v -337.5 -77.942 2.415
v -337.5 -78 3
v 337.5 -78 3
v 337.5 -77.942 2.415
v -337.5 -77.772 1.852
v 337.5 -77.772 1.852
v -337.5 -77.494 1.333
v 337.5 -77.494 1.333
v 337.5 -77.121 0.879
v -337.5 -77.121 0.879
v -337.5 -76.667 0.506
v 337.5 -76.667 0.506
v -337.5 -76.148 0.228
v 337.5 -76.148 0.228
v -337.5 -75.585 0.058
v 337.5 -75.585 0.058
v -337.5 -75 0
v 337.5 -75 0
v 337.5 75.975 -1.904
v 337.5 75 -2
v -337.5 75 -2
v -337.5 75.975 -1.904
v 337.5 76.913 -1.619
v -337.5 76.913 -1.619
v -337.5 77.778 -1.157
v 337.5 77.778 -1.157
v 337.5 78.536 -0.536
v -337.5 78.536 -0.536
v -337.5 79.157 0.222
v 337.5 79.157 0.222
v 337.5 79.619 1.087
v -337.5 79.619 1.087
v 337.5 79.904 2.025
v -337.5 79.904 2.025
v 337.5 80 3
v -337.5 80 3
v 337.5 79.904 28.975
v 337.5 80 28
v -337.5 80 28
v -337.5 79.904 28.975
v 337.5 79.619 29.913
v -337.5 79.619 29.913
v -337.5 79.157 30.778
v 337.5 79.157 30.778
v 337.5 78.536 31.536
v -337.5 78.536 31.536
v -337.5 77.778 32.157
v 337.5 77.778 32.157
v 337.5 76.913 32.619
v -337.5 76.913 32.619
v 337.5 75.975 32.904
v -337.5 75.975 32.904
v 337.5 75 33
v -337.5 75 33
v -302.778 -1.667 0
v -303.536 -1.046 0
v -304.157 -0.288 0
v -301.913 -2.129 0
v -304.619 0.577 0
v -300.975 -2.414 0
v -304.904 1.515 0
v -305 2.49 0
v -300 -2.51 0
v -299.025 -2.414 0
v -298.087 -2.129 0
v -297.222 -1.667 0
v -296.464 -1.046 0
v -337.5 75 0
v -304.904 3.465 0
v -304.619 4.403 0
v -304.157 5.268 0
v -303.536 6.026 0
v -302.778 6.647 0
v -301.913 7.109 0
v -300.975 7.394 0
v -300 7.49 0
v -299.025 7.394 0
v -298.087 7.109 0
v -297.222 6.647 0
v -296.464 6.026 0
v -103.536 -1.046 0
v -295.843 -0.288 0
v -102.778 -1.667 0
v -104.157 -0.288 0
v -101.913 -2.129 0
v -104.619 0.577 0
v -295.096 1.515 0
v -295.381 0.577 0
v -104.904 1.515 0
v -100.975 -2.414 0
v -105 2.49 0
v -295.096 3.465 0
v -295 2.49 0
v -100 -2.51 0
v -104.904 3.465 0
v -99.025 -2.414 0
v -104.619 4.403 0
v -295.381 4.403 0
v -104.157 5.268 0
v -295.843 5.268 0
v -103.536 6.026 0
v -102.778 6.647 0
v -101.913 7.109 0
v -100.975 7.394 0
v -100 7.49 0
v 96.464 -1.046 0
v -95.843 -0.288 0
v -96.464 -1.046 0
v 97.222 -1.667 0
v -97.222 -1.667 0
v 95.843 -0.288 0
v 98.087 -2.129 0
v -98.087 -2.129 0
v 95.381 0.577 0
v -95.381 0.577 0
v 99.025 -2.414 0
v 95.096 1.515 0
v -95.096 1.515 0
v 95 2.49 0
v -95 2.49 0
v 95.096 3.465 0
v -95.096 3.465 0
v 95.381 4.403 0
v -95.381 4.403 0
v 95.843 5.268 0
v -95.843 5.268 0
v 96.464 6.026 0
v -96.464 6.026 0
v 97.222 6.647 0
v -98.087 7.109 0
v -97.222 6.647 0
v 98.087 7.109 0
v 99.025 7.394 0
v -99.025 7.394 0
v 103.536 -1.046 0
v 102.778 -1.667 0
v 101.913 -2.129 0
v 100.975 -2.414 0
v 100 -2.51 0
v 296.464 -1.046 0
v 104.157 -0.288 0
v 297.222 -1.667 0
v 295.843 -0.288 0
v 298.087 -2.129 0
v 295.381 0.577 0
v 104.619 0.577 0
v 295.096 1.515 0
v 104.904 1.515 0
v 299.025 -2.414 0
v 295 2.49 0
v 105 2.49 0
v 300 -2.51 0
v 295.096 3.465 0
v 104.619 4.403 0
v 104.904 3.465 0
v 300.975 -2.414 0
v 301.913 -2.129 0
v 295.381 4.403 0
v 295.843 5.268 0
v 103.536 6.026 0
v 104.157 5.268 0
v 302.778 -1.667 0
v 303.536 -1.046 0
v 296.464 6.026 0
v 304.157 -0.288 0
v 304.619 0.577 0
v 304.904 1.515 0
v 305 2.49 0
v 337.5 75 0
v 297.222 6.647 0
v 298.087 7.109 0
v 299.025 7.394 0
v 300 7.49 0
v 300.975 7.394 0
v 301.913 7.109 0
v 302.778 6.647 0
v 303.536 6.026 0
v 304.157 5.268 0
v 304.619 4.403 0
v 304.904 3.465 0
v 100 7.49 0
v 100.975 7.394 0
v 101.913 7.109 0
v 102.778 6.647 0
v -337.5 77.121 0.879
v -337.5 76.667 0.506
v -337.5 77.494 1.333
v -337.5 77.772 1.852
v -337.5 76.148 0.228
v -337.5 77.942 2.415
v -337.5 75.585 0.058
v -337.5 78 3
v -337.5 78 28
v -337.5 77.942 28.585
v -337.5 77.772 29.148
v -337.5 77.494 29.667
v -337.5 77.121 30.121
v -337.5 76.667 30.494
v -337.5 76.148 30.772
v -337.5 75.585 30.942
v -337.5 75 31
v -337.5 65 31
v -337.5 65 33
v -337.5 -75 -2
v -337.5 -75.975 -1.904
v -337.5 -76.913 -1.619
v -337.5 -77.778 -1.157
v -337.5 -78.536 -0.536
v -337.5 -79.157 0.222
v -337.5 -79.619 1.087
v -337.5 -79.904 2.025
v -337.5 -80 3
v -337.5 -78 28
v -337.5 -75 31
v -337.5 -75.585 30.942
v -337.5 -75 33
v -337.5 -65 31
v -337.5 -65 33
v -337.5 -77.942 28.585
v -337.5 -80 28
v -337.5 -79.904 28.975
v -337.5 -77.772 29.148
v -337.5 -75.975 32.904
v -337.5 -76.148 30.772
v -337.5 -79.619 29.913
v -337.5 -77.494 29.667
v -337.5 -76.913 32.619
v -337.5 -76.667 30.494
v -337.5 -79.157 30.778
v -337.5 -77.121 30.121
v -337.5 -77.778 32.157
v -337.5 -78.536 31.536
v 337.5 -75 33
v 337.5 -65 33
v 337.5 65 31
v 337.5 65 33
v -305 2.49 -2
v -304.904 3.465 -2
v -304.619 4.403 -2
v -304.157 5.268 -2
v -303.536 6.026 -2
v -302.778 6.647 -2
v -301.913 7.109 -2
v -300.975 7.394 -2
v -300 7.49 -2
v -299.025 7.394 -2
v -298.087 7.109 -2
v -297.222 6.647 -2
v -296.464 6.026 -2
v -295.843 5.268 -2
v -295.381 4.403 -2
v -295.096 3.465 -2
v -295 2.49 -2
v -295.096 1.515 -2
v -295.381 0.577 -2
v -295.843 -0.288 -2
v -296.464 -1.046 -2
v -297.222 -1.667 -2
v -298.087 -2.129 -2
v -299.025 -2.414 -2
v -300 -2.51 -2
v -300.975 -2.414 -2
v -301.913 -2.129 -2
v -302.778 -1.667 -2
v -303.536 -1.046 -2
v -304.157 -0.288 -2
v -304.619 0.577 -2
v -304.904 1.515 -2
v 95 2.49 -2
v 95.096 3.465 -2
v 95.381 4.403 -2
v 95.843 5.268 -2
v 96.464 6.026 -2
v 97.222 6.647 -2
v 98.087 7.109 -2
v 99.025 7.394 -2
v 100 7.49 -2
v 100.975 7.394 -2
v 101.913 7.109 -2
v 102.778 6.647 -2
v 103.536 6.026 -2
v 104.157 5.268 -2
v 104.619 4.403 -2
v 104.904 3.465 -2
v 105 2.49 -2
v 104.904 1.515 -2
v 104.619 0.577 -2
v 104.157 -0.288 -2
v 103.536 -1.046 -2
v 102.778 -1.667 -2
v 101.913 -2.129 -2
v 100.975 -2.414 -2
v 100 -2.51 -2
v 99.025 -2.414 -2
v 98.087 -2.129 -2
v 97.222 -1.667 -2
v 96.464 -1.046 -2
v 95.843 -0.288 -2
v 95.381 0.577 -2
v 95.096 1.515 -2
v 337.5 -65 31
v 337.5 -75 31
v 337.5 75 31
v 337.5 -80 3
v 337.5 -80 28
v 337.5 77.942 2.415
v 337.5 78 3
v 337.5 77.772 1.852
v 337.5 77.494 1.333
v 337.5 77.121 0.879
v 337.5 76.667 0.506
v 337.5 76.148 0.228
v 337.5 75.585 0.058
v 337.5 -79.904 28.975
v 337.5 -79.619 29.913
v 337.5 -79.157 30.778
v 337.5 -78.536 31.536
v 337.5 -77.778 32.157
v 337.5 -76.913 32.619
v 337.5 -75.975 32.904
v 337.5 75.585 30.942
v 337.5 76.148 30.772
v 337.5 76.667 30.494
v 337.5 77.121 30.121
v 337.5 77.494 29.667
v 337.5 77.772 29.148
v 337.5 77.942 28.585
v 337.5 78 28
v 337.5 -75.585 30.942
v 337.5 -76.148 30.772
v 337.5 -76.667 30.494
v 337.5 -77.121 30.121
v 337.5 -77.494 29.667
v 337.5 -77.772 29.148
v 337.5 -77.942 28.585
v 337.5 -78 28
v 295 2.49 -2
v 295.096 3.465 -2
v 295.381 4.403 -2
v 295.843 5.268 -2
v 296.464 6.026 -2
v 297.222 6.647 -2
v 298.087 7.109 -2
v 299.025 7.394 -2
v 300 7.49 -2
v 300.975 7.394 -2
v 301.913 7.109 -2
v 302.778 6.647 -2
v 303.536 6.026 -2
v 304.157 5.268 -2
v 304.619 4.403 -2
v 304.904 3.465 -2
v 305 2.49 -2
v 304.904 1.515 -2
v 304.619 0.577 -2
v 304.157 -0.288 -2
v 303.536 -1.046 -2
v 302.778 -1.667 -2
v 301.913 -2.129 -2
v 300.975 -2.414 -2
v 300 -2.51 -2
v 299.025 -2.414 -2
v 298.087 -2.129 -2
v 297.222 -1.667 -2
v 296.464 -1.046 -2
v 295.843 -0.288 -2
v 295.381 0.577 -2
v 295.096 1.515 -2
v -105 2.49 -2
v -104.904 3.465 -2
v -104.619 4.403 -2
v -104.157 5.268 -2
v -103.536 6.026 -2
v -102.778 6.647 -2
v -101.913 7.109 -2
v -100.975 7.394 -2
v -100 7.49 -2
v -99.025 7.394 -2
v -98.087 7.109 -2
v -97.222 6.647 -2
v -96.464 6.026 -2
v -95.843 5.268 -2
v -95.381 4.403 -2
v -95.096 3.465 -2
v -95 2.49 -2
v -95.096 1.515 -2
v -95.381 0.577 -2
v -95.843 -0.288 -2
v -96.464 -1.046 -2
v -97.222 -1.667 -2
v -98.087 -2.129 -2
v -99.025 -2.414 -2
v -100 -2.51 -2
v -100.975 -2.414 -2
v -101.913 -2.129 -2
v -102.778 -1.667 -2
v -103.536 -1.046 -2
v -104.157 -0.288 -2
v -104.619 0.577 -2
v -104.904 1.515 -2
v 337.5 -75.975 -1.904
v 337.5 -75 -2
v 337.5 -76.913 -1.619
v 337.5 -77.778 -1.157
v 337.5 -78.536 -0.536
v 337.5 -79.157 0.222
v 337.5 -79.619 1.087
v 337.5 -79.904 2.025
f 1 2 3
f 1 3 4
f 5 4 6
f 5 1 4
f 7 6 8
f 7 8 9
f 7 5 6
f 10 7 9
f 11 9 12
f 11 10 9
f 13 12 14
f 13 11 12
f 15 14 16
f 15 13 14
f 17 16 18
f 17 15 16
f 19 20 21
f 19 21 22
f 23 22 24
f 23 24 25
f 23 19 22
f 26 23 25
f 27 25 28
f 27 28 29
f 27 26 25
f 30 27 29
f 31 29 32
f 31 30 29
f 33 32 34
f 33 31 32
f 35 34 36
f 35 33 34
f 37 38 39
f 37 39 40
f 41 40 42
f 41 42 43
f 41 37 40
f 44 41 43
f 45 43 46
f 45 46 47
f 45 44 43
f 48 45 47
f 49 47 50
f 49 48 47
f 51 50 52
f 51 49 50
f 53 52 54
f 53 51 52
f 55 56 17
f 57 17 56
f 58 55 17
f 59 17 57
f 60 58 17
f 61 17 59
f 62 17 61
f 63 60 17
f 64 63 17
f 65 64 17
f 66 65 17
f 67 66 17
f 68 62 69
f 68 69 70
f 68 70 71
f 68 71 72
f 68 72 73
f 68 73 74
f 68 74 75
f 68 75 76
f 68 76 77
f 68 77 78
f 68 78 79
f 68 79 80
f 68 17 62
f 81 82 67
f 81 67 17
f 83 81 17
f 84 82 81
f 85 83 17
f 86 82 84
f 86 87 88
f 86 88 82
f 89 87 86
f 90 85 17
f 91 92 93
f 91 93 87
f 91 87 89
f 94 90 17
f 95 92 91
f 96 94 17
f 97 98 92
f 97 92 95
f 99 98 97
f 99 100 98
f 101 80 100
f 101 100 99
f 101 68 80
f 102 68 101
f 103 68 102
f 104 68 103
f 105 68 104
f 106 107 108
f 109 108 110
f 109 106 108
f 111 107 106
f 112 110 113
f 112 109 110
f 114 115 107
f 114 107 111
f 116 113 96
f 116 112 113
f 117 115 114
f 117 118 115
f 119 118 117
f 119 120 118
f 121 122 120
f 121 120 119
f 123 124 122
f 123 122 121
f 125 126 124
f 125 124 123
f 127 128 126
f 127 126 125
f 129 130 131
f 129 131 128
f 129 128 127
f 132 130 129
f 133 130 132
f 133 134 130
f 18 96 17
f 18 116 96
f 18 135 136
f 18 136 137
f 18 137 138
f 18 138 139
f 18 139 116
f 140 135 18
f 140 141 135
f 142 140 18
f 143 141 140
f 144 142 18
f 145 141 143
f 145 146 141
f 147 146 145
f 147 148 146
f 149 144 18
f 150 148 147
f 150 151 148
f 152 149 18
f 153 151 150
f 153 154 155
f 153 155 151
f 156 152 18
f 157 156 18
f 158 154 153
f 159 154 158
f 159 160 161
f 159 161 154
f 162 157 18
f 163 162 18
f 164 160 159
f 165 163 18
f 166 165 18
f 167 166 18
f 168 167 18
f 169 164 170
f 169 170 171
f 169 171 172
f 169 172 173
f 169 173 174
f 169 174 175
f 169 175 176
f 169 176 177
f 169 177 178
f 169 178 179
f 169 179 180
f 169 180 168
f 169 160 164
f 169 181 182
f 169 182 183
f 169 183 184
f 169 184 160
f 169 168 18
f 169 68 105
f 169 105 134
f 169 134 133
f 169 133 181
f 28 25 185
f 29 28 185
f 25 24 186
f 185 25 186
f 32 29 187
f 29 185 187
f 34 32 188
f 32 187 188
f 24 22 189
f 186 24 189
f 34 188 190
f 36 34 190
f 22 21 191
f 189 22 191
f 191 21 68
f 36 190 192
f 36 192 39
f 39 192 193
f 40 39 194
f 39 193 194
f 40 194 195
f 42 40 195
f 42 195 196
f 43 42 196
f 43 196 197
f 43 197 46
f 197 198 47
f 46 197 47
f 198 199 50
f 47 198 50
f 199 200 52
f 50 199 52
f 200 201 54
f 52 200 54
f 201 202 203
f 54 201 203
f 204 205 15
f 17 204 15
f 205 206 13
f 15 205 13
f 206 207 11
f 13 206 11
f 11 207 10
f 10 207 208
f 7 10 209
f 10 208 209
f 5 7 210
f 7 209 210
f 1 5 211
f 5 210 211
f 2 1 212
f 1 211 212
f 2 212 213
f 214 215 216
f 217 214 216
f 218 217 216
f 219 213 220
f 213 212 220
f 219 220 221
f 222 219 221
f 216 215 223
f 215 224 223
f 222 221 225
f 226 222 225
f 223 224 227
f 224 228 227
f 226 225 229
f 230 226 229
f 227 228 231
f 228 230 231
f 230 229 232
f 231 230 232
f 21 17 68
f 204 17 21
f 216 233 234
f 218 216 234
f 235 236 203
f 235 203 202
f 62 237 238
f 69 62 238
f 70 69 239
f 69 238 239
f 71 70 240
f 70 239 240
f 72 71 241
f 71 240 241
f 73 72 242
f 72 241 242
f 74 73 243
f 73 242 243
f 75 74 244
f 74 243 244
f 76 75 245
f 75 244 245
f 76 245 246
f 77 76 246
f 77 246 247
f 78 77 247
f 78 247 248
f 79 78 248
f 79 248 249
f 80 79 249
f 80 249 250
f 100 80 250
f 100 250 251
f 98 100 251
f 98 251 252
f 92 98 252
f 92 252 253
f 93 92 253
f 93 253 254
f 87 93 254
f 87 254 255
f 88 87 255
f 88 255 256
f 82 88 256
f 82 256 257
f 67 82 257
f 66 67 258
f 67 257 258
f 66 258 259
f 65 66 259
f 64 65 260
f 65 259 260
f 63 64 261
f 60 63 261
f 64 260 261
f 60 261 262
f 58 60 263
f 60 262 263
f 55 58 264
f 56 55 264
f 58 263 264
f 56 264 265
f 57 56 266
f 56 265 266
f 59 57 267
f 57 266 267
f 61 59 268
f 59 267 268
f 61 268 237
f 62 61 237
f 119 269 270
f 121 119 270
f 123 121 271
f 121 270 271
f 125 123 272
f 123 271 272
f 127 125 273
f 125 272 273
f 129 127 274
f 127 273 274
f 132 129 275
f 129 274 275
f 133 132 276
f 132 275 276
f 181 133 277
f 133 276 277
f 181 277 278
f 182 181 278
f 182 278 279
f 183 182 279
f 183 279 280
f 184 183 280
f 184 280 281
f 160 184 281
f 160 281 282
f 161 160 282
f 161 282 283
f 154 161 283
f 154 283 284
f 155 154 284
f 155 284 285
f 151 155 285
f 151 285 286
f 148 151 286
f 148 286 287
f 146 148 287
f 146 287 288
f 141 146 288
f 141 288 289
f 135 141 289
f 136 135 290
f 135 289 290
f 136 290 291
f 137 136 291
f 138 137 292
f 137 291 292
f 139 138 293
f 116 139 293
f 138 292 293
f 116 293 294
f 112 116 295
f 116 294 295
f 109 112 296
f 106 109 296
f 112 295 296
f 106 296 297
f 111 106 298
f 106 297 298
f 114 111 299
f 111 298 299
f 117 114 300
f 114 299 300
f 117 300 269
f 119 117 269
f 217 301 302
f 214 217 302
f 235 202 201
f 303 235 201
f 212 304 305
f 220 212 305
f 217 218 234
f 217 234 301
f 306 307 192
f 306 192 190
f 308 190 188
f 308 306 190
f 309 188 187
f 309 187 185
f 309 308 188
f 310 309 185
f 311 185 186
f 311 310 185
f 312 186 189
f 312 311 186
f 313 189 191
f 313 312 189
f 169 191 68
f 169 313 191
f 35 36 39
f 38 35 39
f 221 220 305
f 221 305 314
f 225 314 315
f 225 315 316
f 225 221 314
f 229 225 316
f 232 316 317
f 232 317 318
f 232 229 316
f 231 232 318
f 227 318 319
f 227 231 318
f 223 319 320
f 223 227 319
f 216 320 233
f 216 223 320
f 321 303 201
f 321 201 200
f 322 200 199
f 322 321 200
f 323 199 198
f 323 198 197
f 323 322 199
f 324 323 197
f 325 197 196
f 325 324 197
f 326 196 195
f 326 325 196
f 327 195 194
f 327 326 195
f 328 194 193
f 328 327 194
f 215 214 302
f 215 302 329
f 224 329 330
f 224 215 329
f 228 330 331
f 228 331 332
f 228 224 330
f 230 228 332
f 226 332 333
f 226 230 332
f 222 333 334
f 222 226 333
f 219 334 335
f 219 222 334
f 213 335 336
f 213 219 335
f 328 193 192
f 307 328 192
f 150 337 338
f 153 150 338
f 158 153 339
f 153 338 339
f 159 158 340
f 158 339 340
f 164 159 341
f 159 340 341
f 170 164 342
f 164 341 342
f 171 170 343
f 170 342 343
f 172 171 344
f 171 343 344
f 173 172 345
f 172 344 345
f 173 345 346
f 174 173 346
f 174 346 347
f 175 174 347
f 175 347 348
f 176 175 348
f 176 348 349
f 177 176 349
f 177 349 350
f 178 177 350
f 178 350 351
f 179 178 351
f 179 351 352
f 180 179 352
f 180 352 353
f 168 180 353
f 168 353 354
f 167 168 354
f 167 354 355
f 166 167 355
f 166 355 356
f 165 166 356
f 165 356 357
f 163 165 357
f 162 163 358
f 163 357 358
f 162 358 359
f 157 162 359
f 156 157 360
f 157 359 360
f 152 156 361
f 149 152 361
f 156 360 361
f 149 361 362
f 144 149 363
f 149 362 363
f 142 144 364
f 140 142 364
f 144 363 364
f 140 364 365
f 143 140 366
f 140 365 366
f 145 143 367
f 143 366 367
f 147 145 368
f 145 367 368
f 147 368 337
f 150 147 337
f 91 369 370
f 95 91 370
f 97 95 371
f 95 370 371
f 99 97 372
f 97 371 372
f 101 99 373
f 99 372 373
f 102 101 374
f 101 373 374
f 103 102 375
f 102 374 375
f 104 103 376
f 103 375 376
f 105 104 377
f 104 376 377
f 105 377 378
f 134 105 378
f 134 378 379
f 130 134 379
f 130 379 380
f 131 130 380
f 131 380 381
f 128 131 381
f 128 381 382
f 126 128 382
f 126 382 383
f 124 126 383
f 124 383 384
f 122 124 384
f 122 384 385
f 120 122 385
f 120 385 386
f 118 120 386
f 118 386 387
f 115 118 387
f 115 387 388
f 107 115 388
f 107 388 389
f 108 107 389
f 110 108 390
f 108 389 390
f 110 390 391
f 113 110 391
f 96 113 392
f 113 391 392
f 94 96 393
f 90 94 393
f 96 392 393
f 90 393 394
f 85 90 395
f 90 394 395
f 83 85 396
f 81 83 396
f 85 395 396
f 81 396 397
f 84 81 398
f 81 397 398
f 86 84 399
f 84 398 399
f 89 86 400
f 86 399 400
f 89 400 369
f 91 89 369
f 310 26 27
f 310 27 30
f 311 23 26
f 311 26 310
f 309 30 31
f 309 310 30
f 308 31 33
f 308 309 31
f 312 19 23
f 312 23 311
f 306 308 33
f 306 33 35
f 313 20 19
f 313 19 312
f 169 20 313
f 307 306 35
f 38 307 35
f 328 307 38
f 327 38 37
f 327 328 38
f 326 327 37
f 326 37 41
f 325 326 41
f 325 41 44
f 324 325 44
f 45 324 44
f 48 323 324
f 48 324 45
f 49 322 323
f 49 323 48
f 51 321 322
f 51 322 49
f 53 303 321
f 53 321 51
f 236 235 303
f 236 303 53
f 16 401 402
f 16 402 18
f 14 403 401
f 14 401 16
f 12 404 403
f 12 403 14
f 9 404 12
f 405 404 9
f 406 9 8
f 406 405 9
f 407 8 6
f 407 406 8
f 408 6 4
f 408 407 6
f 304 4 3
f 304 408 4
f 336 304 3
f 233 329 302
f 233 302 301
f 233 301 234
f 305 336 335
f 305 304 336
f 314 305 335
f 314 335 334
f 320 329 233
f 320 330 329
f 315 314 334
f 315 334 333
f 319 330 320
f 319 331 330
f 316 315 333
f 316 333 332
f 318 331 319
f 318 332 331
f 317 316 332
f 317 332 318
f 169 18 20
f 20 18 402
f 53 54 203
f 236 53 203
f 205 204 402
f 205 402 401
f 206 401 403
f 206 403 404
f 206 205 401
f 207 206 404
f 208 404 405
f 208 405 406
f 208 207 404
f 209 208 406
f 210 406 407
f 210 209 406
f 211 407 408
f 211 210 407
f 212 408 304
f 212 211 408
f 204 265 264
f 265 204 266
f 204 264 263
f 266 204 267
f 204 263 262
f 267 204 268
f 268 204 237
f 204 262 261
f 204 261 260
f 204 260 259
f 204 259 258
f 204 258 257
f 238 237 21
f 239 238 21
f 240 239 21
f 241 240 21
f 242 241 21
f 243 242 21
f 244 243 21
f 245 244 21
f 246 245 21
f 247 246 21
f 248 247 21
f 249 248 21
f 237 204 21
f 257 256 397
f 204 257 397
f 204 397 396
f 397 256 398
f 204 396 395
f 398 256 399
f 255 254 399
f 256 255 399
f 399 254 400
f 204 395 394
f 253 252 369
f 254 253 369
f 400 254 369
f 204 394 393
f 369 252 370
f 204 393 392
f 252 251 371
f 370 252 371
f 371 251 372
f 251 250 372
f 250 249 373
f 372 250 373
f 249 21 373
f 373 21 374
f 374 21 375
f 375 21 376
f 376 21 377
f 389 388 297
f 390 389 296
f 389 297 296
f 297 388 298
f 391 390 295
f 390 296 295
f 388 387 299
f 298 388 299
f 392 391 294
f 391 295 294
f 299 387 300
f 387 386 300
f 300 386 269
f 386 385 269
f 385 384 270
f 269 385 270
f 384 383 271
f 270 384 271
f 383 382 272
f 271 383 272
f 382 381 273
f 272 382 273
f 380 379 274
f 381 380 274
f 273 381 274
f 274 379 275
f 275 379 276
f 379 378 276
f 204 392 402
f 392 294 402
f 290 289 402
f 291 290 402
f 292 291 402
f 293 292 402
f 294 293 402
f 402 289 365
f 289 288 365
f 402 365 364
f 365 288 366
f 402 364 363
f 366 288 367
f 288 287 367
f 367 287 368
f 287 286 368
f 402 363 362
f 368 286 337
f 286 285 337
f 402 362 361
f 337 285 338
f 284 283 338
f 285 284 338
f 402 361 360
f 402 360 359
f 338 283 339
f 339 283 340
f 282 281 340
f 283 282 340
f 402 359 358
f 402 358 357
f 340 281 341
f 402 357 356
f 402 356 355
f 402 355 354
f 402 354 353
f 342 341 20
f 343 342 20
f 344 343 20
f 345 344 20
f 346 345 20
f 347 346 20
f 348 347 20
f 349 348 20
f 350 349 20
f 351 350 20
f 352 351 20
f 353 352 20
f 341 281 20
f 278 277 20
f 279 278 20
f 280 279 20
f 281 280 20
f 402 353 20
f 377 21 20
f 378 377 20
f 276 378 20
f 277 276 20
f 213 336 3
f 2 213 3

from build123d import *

# Parameters (mm, degrees)
SKETCH1_W                      = 675
SKETCH1_H                      = 160
BASE_FLANGE1_DEPTH             = 2
EDGE_FLANGE1_STRIP_W           = 14
EDGE_FLANGE1_STRIP_H           = 2
EDGE_FLANGE1_STRIP_CUT_DEPTH   = 675
EDGE_FLANGE1_STRIP_2_W         = 14
EDGE_FLANGE1_STRIP_2_H         = 2
EDGE_FLANGE1_STRIP_CUT_2_DEPTH = 675
EDGE_FLANGE1_DEPTH             = 675
EDGE_FLANGE1_BEND_DEPTH        = 675
EDGE_FLANGE2_STRIP_W           = 14
EDGE_FLANGE2_STRIP_H           = 2
EDGE_FLANGE2_STRIP_CUT_DEPTH   = 675
EDGE_FLANGE2_STRIP_2_W         = 14
EDGE_FLANGE2_STRIP_2_H         = 2
EDGE_FLANGE2_STRIP_CUT_2_DEPTH = 675
EDGE_FLANGE2_DEPTH             = 675
EDGE_FLANGE2_BEND_DEPTH        = 675
SKETCH18_R                     = 5
CUT_EXTRUDE1_DEPTH             = 10
LPATTERN1_COUNT                = 4
LPATTERN1_PITCH                = 200


# Sheet-metal steps are written as plain solids
with BuildPart() as part:
    # Sketch1 → Base-Flange1 (new body)
    with BuildSketch(Plane.XY):
        Rectangle(SKETCH1_W, SKETCH1_H)
    extrude(amount=-BASE_FLANGE1_DEPTH)

    # Edge-Flange1 strip (across the edge) → Edge-Flange1 strip cut (cut)
    with BuildSketch(Plane(origin=(337.5, 80, 0), x_dir=(0, -1, 0), z_dir=(-1, 0, 0))):
        with Locations((-2, -1)):
            Rectangle(EDGE_FLANGE1_STRIP_W, EDGE_FLANGE1_STRIP_H)
    extrude(amount=EDGE_FLANGE1_STRIP_CUT_DEPTH, mode=Mode.SUBTRACT)

    # Edge-Flange1 strip 2 (across the edge) → Edge-Flange1 strip cut 2 (cut)
    with BuildSketch(Plane(origin=(-337.5, -80, 0), x_dir=(0, 1, 0), z_dir=(1, 0, 0))):
        with Locations((-2, -1)):
            Rectangle(EDGE_FLANGE1_STRIP_2_W, EDGE_FLANGE1_STRIP_2_H)
    extrude(amount=EDGE_FLANGE1_STRIP_CUT_2_DEPTH, mode=Mode.SUBTRACT)

    # Edge-Flange1 section (across the edge) → Edge-Flange1 (add)
    with BuildSketch(Plane(origin=(337.5, 80, 0), x_dir=(0, -1, 0), z_dir=(-1, 0, 0))):
        with BuildLine():
            Line((0, 3), (0, 33))
            Line((0, 33), (2, 33))
            Line((2, 33), (2, 3))
            ThreePointArc((2, 3), (2.878679656, 0.878679656), (5, 0))
            Line((5, 0), (5, -2))
            ThreePointArc((5, -2), (1.464466094, -0.535533906), (0, 3))
        make_face()
    extrude(amount=EDGE_FLANGE1_DEPTH)

    # Edge-Flange1 section 2 (across the edge) → Edge-Flange1 bend (add)
    with BuildSketch(Plane(origin=(-337.5, -80, 0), x_dir=(0, 1, 0), z_dir=(1, 0, 0))):
        with BuildLine():
            Line((0, 3), (0, 33))
            Line((0, 33), (2, 33))
            Line((2, 33), (2, 3))
            ThreePointArc((2, 3), (2.878679656, 0.878679656), (5, 0))
            Line((5, 0), (5, -2))
            ThreePointArc((5, -2), (1.464466094, -0.535533906), (0, 3))
        make_face()
    extrude(amount=EDGE_FLANGE1_BEND_DEPTH)

    # Edge-Flange2 strip (across the edge) → Edge-Flange2 strip cut (cut)
    with BuildSketch(Plane(origin=(-337.5, -78, 33), x_dir=(0, 0, -1), z_dir=(1, 0, 0))):
        with Locations((-2, -1)):
            Rectangle(EDGE_FLANGE2_STRIP_W, EDGE_FLANGE2_STRIP_H)
    extrude(amount=EDGE_FLANGE2_STRIP_CUT_DEPTH, mode=Mode.SUBTRACT)

    # Edge-Flange2 strip 2 (across the edge) → Edge-Flange2 strip cut 2 (cut)
    with BuildSketch(Plane(origin=(337.5, 78, 33), x_dir=(0, 0, -1), z_dir=(-1, 0, 0))):
        with Locations((-2, -1)):
            Rectangle(EDGE_FLANGE2_STRIP_2_W, EDGE_FLANGE2_STRIP_2_H)
    extrude(amount=EDGE_FLANGE2_STRIP_CUT_2_DEPTH, mode=Mode.SUBTRACT)

    # Edge-Flange2 section (across the edge) → Edge-Flange2 (add)
    with BuildSketch(Plane(origin=(-337.5, -78, 33), x_dir=(0, 0, -1), z_dir=(1, 0, 0))):
        with BuildLine():
            Line((0, 3), (0, 13))
            Line((0, 13), (2, 13))
            Line((2, 13), (2, 3))
            ThreePointArc((2, 3), (2.878679656, 0.878679656), (5, 0))
            Line((5, 0), (5, -2))
            ThreePointArc((5, -2), (1.464466094, -0.535533906), (0, 3))
        make_face()
    extrude(amount=EDGE_FLANGE2_DEPTH)

    # Edge-Flange2 section 2 (across the edge) → Edge-Flange2 bend (add)
    with BuildSketch(Plane(origin=(337.5, 78, 33), x_dir=(0, 0, -1), z_dir=(-1, 0, 0))):
        with BuildLine():
            Line((0, 3), (0, 13))
            Line((0, 13), (2, 13))
            Line((2, 13), (2, 3))
            ThreePointArc((2, 3), (2.878679656, 0.878679656), (5, 0))
            Line((5, 0), (5, -2))
            ThreePointArc((5, -2), (1.464466094, -0.535533906), (0, 3))
        make_face()
    extrude(amount=EDGE_FLANGE2_BEND_DEPTH)

    # Sketch18 → Cut-Extrude1 (cut)
    with BuildSketch(Plane(origin=(0, 0, -2), x_dir=(-1, 0, 0), z_dir=(0, 0, -1))):
        with Locations((-300, 2.49)):
            Circle(SKETCH18_R)
    cut_extrude1 = extrude(amount=-CUT_EXTRUDE1_DEPTH, mode=Mode.SUBTRACT)

    # LPattern1: Cut-Extrude1 ×4
    with Locations(*[(-i * LPATTERN1_PITCH, 0, 0) for i in range(1, LPATTERN1_COUNT)]):
        add(cut_extrude1, mode=Mode.SUBTRACT)


solid = part.part
